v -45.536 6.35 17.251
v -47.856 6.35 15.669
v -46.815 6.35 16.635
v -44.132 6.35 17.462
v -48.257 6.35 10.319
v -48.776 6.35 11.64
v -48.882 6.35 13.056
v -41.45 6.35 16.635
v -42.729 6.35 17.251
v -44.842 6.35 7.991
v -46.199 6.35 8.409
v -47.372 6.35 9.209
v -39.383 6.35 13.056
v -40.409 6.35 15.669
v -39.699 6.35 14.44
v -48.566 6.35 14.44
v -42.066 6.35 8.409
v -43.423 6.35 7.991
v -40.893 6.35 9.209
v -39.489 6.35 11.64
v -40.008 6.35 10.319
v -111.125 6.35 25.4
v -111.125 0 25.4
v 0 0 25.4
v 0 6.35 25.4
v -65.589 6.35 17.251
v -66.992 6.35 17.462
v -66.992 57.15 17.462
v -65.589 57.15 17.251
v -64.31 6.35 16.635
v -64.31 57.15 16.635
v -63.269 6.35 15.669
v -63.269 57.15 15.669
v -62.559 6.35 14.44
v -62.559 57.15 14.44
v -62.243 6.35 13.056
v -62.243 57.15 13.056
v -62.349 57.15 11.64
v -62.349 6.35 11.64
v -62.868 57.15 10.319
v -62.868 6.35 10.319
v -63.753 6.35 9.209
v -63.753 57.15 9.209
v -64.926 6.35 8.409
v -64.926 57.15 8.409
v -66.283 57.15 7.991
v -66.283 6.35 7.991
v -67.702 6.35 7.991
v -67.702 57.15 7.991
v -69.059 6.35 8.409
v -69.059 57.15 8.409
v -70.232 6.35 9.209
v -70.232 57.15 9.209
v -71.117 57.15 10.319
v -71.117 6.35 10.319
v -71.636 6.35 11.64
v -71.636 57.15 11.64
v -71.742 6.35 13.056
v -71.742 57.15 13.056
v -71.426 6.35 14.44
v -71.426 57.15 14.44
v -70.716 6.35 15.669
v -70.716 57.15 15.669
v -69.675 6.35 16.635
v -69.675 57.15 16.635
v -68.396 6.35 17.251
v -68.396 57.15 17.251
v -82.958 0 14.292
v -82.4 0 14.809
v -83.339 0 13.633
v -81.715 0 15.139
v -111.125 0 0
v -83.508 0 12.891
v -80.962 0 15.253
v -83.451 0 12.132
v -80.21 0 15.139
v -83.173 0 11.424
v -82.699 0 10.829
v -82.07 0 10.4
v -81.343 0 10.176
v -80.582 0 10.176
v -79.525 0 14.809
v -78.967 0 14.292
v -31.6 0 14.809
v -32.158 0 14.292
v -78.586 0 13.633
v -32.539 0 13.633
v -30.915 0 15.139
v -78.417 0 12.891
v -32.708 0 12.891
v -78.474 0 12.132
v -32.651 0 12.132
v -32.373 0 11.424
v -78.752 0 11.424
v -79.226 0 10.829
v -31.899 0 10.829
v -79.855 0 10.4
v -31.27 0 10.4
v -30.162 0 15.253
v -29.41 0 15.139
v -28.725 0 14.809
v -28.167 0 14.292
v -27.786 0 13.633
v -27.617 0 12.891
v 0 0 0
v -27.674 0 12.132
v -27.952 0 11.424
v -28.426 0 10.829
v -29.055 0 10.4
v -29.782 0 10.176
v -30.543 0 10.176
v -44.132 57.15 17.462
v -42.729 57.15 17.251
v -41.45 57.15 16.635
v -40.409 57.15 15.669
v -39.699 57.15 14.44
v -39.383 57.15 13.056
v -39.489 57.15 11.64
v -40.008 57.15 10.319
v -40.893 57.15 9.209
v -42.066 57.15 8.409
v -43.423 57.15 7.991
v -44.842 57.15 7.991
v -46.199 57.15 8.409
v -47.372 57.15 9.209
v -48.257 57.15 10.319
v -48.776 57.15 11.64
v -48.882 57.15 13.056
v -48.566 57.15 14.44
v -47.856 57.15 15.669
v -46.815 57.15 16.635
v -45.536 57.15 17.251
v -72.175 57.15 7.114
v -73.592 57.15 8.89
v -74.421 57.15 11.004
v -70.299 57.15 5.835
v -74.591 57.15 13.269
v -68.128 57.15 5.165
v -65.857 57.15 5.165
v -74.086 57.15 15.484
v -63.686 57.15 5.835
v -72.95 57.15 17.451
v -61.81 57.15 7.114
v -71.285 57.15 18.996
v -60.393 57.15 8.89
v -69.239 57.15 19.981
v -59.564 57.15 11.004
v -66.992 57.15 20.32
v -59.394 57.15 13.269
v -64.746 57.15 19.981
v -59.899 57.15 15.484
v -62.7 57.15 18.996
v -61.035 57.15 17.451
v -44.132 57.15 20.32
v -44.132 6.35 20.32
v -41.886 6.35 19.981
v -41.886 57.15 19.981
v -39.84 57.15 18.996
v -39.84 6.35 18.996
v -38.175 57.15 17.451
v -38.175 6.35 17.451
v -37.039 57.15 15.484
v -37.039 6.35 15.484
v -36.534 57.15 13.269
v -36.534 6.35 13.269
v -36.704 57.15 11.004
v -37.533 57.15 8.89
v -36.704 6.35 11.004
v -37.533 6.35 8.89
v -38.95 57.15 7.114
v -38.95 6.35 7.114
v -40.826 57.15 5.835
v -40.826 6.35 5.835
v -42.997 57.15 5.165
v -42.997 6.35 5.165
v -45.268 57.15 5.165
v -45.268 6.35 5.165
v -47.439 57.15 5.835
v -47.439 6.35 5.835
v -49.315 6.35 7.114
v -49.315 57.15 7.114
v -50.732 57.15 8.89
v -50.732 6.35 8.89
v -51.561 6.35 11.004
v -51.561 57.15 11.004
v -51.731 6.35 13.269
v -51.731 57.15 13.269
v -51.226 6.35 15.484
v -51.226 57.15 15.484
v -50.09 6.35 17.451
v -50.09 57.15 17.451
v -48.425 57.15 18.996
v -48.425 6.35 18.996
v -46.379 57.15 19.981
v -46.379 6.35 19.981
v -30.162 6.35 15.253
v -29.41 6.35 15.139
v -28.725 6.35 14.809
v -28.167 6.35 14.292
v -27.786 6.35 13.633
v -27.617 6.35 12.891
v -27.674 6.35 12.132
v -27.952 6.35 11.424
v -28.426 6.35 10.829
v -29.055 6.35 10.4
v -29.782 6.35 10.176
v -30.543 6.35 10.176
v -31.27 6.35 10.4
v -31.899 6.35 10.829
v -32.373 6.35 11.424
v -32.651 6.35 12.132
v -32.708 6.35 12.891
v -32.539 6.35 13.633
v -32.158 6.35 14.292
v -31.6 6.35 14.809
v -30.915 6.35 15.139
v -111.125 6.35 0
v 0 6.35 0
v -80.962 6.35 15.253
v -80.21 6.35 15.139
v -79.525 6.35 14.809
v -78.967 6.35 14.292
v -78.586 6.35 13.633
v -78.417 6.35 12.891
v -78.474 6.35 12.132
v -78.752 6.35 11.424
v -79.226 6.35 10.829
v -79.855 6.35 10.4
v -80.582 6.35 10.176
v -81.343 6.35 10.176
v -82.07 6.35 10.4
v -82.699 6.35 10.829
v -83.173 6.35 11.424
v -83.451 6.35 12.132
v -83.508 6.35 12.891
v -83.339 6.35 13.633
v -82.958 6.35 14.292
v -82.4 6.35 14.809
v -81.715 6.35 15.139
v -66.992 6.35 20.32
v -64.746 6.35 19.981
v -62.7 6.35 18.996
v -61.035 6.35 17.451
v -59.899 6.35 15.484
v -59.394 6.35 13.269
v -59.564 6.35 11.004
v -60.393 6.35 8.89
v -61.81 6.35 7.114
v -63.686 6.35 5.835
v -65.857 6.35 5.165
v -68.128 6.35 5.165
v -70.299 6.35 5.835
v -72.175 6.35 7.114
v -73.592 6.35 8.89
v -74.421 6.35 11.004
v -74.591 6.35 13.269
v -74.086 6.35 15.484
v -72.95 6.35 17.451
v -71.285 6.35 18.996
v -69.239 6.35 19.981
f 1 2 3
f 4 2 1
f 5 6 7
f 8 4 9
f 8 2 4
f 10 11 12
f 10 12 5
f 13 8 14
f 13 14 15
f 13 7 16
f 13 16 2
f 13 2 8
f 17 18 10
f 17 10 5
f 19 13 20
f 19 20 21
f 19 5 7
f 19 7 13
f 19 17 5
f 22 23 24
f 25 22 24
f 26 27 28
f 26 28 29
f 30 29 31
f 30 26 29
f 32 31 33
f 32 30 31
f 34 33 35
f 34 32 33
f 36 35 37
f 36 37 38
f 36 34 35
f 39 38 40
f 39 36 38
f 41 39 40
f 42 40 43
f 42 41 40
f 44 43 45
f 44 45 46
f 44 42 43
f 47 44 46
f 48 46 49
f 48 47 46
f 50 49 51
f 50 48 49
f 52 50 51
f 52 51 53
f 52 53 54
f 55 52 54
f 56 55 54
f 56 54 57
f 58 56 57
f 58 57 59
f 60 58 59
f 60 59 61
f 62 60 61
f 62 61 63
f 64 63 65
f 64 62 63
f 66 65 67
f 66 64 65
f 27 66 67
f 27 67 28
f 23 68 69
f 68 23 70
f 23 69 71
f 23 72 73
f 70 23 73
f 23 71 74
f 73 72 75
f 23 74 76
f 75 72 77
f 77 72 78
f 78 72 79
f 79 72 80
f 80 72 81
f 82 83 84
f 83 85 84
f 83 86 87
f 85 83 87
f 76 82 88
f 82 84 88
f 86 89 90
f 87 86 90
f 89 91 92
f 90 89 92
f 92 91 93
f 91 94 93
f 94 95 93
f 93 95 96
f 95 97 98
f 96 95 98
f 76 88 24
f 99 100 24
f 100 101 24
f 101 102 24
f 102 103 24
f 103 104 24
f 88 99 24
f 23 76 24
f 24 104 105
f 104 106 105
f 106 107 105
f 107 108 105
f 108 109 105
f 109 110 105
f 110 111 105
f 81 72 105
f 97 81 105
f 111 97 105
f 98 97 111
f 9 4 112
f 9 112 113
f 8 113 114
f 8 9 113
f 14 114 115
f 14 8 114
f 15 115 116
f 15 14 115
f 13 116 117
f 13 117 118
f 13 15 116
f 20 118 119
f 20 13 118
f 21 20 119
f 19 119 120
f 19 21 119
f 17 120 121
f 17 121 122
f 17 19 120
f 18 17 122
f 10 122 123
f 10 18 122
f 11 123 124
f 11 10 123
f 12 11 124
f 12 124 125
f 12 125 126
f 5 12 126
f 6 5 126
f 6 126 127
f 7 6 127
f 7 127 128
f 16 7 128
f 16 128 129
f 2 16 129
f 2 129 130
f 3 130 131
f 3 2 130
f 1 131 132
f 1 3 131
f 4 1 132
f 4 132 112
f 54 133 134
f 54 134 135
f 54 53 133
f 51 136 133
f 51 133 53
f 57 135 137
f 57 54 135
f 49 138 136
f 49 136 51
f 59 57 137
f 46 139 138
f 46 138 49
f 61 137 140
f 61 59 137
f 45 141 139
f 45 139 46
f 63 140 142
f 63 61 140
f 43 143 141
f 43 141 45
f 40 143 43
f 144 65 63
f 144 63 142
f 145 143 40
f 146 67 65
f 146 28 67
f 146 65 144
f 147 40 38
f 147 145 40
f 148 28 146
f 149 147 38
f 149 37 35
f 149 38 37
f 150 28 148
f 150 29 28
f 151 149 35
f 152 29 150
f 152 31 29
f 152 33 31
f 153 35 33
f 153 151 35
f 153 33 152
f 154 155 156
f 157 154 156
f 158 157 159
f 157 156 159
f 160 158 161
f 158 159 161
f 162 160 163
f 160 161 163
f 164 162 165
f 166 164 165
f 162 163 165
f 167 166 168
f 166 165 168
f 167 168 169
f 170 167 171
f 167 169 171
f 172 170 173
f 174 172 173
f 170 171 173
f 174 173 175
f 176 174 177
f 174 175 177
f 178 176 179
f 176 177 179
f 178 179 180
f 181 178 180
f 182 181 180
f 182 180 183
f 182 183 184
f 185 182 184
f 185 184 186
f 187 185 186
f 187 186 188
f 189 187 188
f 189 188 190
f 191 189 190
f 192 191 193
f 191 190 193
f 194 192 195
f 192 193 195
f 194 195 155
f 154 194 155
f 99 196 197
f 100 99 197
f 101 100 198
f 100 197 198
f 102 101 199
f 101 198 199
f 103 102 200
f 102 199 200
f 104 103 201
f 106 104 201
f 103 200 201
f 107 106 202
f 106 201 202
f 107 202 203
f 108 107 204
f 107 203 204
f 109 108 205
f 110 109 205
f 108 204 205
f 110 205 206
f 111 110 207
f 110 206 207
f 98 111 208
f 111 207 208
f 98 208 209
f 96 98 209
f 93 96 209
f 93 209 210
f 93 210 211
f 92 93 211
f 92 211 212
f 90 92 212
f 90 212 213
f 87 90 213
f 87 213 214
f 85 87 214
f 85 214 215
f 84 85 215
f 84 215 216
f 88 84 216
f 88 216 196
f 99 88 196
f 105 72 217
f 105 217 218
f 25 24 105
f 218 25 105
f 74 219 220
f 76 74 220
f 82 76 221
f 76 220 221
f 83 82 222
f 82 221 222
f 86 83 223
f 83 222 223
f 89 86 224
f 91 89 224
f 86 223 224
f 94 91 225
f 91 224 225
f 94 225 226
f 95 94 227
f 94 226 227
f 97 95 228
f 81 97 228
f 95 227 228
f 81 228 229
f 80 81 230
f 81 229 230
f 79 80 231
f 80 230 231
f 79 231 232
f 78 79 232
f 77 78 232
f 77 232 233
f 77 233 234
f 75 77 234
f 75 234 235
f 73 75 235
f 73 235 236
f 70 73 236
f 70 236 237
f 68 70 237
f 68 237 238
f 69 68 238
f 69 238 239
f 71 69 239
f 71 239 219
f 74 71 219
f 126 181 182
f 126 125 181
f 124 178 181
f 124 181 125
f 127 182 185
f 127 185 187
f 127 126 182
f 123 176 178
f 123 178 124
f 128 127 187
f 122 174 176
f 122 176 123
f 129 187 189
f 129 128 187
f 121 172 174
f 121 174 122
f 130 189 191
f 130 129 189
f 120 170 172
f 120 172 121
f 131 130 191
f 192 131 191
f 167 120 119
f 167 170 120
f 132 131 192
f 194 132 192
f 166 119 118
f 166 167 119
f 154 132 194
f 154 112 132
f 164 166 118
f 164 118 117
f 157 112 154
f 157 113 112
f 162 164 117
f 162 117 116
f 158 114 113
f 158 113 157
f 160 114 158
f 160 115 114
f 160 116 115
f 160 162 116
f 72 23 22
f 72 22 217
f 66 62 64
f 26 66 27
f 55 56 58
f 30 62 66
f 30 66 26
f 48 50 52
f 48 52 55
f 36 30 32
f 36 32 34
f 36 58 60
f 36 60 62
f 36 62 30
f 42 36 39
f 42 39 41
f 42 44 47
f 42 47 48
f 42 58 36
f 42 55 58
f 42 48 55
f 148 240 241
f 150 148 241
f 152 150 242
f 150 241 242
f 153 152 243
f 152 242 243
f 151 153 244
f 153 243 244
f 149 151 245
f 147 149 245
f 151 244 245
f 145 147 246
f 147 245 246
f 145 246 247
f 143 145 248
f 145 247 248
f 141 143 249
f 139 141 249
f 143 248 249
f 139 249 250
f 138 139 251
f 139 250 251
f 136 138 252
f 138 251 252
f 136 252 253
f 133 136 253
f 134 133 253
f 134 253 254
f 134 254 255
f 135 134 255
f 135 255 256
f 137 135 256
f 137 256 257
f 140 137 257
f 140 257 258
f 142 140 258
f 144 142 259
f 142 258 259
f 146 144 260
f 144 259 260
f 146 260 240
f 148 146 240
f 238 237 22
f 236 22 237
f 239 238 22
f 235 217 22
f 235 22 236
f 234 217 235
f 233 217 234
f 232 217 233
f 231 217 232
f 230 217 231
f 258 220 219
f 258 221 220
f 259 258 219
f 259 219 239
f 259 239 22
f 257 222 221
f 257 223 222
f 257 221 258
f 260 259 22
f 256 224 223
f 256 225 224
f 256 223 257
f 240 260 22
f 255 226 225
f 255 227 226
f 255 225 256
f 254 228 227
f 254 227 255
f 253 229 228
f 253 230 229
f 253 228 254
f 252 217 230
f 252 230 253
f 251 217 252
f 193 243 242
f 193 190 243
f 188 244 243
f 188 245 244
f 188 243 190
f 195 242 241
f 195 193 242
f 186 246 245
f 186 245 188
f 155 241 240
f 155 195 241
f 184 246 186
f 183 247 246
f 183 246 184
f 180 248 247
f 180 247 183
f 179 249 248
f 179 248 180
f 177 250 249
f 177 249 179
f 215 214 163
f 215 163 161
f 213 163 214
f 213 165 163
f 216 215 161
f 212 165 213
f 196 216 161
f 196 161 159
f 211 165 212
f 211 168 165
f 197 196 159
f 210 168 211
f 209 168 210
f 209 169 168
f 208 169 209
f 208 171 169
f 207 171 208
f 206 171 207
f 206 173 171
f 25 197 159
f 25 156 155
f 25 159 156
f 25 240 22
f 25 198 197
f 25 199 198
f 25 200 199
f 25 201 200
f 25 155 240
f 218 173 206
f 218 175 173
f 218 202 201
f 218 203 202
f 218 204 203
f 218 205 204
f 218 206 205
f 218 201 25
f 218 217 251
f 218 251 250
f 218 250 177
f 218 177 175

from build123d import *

# Parameters (mm, degrees)
SKETCH1_W           = 111.125
SKETCH1_H           = 25.4
BOSS_EXTRUDE1_DEPTH = 6.35
SKETCH2_R           = 7.62
SKETCH2_R_2         = 4.7625
BOSS_EXTRUDE2_DEPTH = 50.8
SKETCH2_9_R         = 2.5527
CUT_EXTRUDE1_DEPTH  = 125.798099445


with BuildPart() as part:
    # Sketch1 → Boss-Extrude1 (new body)
    with BuildSketch(Plane(origin=(0, 0, 0), x_dir=(1, 0, 0), z_dir=(0, 1, 0))):
        with Locations((-55.5625, -12.7)):
            Rectangle(SKETCH1_W, SKETCH1_H)
    extrude(amount=BOSS_EXTRUDE1_DEPTH)

    # Sketch2 → Boss-Extrude2 (add)
    # profile 1 of 2: a face of its own
    with BuildSketch(Plane(origin=(0, 6.35, 0), x_dir=(1, 0, 0), z_dir=(0, 1, 0))):
        with Locations((-44.1325, -12.7)):
            Circle(SKETCH2_R)
        with Locations((-44.1325, -12.7)):
            Circle(SKETCH2_R_2, mode=Mode.SUBTRACT)
    # profile 2 of 2: a face of its own
    with BuildSketch(Plane(origin=(0, 6.35, 0), x_dir=(1, 0, 0), z_dir=(0, 1, 0))):
        with Locations((-66.9925, -12.7)):
            Circle(SKETCH2_R)
        with Locations((-66.9925, -12.7)):
            Circle(SKETCH2_R_2, mode=Mode.SUBTRACT)
    extrude(amount=BOSS_EXTRUDE2_DEPTH)

    # Sketch2<9> → Cut-Extrude1 (cut, through all)
    with BuildSketch(Plane(origin=(0, 6.35, 0), x_dir=(1, 0, 0), z_dir=(0, 1, 0))):
        with Locations((-30.1625, -12.7)):
            Circle(SKETCH2_9_R)
        with Locations((-80.9625, -12.7)):
            Circle(SKETCH2_9_R)
    extrude(amount=-CUT_EXTRUDE1_DEPTH, mode=Mode.SUBTRACT)


solid = part.part
